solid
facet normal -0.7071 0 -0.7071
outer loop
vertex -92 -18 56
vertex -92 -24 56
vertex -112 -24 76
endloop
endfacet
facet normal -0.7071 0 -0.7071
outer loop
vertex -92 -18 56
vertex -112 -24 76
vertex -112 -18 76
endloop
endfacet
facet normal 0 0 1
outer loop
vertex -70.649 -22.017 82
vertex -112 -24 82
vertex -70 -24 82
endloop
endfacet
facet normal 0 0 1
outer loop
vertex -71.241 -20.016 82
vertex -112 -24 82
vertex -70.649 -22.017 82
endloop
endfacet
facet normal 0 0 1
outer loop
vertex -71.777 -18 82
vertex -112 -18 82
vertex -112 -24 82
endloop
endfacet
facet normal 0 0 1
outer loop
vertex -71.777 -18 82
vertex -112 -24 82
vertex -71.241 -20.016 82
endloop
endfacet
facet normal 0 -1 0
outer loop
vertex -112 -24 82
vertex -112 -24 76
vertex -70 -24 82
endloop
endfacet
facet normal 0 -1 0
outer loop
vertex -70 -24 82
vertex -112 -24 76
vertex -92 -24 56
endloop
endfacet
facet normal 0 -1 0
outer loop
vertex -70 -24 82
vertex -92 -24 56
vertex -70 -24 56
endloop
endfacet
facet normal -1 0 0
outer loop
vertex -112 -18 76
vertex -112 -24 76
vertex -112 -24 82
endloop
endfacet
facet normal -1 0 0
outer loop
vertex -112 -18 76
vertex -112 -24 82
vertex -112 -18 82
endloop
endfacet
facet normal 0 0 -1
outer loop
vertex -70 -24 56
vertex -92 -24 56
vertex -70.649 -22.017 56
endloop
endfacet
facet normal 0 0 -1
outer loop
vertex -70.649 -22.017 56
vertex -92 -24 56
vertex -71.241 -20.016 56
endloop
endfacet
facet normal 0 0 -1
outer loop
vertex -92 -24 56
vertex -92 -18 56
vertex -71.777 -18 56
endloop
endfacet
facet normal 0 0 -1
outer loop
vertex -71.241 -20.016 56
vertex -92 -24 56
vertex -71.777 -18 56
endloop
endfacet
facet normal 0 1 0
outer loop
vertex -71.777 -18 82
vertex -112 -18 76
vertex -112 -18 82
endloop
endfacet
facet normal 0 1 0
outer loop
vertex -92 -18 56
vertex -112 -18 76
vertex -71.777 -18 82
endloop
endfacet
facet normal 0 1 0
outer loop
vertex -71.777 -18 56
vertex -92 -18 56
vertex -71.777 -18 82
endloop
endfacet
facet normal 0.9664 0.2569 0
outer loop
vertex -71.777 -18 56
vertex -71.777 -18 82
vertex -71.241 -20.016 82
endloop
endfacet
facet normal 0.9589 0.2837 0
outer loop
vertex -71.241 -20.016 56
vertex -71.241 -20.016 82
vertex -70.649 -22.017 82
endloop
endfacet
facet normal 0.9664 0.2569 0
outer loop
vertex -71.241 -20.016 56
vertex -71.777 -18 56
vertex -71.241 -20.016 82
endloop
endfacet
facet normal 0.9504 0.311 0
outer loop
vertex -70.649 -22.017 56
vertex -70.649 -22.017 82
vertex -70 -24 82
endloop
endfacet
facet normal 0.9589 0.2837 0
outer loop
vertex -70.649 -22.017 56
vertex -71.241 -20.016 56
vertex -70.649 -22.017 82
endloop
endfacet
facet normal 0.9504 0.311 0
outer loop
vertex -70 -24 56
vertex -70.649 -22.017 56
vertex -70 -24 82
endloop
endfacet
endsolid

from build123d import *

# Parameters (mm, degrees)
CYLINDER906_R     = 74
CYLINDER906_DEPTH = 32
BOX432_W          = 50
BOX432_H          = 6
BOX432_DEPTH      = 26
CHAMFER003_SIZE   = 20


with BuildPart() as v_lec906:
    # Cylinder906 → Cylinder906 (new body)
    with BuildSketch(Plane.XY.offset(50)):
        Circle(CYLINDER906_R)
    extrude(amount=CYLINDER906_DEPTH)


with BuildPart() as chamfer003:
    # Box432 → Box432 (new body)
    with BuildSketch(Plane(origin=(-112, -24, 56), x_dir=(1, 0, 0), z_dir=(0, 0, 1))):
        with Locations((25, 3)):
            Rectangle(BOX432_W, BOX432_H)
    extrude(amount=BOX432_DEPTH)

    # Cut406: cut Válec906
    add(v_lec906.part, mode=Mode.SUBTRACT)

    # Chamfer003
    chamfer003_edges = [chamfer003.edges().sort_by_distance(p)[0] for p in [
        (-112, -21, 56),
    ]]
    chamfer(chamfer003_edges, length=CHAMFER003_SIZE)


solid = chamfer003.part
